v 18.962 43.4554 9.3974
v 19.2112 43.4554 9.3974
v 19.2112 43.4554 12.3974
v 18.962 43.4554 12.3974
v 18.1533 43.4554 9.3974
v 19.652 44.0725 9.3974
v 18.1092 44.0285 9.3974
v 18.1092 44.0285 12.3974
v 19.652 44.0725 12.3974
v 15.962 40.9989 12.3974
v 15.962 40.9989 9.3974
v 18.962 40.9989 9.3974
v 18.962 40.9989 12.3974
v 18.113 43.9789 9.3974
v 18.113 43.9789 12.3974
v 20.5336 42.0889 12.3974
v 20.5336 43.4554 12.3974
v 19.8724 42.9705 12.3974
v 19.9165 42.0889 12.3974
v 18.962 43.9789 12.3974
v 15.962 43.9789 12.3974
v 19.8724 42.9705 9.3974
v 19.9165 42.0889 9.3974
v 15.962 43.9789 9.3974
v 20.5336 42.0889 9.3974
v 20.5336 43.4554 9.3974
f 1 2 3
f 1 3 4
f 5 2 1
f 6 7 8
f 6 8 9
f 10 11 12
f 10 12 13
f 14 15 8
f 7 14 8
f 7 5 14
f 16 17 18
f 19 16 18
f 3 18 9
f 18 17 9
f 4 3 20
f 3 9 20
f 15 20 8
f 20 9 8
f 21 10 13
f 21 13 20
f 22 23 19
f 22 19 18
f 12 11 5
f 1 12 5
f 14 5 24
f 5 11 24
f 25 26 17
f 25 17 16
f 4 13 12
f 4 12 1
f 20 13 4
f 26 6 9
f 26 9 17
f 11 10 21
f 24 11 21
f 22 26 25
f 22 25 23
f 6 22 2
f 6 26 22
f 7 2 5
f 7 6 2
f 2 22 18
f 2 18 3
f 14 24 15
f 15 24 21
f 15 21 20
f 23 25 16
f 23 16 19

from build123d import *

# Parameters (mm, degrees)
RECTANGLE008_W   = 2.98
RECTANGLE008_H   = 3
EXTRUDE026_DEPTH = 3
EXTRUDE025_DEPTH = 3


with BuildPart() as extrude026:
    # Rectangle008 → Extrude026 (new body)
    with BuildSketch(Plane(origin=(22.53, 42.0889, 12.3974), x_dir=(0, 1, 0), z_dir=(1, 0, 0))):
        with Locations((1.49, -1.5)):
            Rectangle(RECTANGLE008_W, RECTANGLE008_H)
    extrude(amount=EXTRUDE026_DEPTH)


with BuildPart() as extrude026_1:
    # Extrude026 placement: moved
    add(extrude026.part.moved(Location((-6.56795, -1.09, 0))))


with BuildPart() as alca1:
    # DWire → Extrude025 (new body)
    with BuildSketch(Plane.XY):
        Polygon((24.153275, 43.285419), (24.109194, 43.858463), (25.652, 43.902542), (26.533607, 43.285419), (26.533607, 41.918934), (25.916481, 41.918934), (25.872402, 42.800537), (25.211199, 43.285419), align=None)
    extrude(amount=EXTRUDE025_DEPTH)


with BuildPart() as alca1_1:
    # Extrude025 placement: moved
    add(alca1.part.moved(Location((-6, 0.17, 9.39737))))

    # Fusion001: union Extrude026
    add(extrude026_1.part)


solid = alca1_1.part
